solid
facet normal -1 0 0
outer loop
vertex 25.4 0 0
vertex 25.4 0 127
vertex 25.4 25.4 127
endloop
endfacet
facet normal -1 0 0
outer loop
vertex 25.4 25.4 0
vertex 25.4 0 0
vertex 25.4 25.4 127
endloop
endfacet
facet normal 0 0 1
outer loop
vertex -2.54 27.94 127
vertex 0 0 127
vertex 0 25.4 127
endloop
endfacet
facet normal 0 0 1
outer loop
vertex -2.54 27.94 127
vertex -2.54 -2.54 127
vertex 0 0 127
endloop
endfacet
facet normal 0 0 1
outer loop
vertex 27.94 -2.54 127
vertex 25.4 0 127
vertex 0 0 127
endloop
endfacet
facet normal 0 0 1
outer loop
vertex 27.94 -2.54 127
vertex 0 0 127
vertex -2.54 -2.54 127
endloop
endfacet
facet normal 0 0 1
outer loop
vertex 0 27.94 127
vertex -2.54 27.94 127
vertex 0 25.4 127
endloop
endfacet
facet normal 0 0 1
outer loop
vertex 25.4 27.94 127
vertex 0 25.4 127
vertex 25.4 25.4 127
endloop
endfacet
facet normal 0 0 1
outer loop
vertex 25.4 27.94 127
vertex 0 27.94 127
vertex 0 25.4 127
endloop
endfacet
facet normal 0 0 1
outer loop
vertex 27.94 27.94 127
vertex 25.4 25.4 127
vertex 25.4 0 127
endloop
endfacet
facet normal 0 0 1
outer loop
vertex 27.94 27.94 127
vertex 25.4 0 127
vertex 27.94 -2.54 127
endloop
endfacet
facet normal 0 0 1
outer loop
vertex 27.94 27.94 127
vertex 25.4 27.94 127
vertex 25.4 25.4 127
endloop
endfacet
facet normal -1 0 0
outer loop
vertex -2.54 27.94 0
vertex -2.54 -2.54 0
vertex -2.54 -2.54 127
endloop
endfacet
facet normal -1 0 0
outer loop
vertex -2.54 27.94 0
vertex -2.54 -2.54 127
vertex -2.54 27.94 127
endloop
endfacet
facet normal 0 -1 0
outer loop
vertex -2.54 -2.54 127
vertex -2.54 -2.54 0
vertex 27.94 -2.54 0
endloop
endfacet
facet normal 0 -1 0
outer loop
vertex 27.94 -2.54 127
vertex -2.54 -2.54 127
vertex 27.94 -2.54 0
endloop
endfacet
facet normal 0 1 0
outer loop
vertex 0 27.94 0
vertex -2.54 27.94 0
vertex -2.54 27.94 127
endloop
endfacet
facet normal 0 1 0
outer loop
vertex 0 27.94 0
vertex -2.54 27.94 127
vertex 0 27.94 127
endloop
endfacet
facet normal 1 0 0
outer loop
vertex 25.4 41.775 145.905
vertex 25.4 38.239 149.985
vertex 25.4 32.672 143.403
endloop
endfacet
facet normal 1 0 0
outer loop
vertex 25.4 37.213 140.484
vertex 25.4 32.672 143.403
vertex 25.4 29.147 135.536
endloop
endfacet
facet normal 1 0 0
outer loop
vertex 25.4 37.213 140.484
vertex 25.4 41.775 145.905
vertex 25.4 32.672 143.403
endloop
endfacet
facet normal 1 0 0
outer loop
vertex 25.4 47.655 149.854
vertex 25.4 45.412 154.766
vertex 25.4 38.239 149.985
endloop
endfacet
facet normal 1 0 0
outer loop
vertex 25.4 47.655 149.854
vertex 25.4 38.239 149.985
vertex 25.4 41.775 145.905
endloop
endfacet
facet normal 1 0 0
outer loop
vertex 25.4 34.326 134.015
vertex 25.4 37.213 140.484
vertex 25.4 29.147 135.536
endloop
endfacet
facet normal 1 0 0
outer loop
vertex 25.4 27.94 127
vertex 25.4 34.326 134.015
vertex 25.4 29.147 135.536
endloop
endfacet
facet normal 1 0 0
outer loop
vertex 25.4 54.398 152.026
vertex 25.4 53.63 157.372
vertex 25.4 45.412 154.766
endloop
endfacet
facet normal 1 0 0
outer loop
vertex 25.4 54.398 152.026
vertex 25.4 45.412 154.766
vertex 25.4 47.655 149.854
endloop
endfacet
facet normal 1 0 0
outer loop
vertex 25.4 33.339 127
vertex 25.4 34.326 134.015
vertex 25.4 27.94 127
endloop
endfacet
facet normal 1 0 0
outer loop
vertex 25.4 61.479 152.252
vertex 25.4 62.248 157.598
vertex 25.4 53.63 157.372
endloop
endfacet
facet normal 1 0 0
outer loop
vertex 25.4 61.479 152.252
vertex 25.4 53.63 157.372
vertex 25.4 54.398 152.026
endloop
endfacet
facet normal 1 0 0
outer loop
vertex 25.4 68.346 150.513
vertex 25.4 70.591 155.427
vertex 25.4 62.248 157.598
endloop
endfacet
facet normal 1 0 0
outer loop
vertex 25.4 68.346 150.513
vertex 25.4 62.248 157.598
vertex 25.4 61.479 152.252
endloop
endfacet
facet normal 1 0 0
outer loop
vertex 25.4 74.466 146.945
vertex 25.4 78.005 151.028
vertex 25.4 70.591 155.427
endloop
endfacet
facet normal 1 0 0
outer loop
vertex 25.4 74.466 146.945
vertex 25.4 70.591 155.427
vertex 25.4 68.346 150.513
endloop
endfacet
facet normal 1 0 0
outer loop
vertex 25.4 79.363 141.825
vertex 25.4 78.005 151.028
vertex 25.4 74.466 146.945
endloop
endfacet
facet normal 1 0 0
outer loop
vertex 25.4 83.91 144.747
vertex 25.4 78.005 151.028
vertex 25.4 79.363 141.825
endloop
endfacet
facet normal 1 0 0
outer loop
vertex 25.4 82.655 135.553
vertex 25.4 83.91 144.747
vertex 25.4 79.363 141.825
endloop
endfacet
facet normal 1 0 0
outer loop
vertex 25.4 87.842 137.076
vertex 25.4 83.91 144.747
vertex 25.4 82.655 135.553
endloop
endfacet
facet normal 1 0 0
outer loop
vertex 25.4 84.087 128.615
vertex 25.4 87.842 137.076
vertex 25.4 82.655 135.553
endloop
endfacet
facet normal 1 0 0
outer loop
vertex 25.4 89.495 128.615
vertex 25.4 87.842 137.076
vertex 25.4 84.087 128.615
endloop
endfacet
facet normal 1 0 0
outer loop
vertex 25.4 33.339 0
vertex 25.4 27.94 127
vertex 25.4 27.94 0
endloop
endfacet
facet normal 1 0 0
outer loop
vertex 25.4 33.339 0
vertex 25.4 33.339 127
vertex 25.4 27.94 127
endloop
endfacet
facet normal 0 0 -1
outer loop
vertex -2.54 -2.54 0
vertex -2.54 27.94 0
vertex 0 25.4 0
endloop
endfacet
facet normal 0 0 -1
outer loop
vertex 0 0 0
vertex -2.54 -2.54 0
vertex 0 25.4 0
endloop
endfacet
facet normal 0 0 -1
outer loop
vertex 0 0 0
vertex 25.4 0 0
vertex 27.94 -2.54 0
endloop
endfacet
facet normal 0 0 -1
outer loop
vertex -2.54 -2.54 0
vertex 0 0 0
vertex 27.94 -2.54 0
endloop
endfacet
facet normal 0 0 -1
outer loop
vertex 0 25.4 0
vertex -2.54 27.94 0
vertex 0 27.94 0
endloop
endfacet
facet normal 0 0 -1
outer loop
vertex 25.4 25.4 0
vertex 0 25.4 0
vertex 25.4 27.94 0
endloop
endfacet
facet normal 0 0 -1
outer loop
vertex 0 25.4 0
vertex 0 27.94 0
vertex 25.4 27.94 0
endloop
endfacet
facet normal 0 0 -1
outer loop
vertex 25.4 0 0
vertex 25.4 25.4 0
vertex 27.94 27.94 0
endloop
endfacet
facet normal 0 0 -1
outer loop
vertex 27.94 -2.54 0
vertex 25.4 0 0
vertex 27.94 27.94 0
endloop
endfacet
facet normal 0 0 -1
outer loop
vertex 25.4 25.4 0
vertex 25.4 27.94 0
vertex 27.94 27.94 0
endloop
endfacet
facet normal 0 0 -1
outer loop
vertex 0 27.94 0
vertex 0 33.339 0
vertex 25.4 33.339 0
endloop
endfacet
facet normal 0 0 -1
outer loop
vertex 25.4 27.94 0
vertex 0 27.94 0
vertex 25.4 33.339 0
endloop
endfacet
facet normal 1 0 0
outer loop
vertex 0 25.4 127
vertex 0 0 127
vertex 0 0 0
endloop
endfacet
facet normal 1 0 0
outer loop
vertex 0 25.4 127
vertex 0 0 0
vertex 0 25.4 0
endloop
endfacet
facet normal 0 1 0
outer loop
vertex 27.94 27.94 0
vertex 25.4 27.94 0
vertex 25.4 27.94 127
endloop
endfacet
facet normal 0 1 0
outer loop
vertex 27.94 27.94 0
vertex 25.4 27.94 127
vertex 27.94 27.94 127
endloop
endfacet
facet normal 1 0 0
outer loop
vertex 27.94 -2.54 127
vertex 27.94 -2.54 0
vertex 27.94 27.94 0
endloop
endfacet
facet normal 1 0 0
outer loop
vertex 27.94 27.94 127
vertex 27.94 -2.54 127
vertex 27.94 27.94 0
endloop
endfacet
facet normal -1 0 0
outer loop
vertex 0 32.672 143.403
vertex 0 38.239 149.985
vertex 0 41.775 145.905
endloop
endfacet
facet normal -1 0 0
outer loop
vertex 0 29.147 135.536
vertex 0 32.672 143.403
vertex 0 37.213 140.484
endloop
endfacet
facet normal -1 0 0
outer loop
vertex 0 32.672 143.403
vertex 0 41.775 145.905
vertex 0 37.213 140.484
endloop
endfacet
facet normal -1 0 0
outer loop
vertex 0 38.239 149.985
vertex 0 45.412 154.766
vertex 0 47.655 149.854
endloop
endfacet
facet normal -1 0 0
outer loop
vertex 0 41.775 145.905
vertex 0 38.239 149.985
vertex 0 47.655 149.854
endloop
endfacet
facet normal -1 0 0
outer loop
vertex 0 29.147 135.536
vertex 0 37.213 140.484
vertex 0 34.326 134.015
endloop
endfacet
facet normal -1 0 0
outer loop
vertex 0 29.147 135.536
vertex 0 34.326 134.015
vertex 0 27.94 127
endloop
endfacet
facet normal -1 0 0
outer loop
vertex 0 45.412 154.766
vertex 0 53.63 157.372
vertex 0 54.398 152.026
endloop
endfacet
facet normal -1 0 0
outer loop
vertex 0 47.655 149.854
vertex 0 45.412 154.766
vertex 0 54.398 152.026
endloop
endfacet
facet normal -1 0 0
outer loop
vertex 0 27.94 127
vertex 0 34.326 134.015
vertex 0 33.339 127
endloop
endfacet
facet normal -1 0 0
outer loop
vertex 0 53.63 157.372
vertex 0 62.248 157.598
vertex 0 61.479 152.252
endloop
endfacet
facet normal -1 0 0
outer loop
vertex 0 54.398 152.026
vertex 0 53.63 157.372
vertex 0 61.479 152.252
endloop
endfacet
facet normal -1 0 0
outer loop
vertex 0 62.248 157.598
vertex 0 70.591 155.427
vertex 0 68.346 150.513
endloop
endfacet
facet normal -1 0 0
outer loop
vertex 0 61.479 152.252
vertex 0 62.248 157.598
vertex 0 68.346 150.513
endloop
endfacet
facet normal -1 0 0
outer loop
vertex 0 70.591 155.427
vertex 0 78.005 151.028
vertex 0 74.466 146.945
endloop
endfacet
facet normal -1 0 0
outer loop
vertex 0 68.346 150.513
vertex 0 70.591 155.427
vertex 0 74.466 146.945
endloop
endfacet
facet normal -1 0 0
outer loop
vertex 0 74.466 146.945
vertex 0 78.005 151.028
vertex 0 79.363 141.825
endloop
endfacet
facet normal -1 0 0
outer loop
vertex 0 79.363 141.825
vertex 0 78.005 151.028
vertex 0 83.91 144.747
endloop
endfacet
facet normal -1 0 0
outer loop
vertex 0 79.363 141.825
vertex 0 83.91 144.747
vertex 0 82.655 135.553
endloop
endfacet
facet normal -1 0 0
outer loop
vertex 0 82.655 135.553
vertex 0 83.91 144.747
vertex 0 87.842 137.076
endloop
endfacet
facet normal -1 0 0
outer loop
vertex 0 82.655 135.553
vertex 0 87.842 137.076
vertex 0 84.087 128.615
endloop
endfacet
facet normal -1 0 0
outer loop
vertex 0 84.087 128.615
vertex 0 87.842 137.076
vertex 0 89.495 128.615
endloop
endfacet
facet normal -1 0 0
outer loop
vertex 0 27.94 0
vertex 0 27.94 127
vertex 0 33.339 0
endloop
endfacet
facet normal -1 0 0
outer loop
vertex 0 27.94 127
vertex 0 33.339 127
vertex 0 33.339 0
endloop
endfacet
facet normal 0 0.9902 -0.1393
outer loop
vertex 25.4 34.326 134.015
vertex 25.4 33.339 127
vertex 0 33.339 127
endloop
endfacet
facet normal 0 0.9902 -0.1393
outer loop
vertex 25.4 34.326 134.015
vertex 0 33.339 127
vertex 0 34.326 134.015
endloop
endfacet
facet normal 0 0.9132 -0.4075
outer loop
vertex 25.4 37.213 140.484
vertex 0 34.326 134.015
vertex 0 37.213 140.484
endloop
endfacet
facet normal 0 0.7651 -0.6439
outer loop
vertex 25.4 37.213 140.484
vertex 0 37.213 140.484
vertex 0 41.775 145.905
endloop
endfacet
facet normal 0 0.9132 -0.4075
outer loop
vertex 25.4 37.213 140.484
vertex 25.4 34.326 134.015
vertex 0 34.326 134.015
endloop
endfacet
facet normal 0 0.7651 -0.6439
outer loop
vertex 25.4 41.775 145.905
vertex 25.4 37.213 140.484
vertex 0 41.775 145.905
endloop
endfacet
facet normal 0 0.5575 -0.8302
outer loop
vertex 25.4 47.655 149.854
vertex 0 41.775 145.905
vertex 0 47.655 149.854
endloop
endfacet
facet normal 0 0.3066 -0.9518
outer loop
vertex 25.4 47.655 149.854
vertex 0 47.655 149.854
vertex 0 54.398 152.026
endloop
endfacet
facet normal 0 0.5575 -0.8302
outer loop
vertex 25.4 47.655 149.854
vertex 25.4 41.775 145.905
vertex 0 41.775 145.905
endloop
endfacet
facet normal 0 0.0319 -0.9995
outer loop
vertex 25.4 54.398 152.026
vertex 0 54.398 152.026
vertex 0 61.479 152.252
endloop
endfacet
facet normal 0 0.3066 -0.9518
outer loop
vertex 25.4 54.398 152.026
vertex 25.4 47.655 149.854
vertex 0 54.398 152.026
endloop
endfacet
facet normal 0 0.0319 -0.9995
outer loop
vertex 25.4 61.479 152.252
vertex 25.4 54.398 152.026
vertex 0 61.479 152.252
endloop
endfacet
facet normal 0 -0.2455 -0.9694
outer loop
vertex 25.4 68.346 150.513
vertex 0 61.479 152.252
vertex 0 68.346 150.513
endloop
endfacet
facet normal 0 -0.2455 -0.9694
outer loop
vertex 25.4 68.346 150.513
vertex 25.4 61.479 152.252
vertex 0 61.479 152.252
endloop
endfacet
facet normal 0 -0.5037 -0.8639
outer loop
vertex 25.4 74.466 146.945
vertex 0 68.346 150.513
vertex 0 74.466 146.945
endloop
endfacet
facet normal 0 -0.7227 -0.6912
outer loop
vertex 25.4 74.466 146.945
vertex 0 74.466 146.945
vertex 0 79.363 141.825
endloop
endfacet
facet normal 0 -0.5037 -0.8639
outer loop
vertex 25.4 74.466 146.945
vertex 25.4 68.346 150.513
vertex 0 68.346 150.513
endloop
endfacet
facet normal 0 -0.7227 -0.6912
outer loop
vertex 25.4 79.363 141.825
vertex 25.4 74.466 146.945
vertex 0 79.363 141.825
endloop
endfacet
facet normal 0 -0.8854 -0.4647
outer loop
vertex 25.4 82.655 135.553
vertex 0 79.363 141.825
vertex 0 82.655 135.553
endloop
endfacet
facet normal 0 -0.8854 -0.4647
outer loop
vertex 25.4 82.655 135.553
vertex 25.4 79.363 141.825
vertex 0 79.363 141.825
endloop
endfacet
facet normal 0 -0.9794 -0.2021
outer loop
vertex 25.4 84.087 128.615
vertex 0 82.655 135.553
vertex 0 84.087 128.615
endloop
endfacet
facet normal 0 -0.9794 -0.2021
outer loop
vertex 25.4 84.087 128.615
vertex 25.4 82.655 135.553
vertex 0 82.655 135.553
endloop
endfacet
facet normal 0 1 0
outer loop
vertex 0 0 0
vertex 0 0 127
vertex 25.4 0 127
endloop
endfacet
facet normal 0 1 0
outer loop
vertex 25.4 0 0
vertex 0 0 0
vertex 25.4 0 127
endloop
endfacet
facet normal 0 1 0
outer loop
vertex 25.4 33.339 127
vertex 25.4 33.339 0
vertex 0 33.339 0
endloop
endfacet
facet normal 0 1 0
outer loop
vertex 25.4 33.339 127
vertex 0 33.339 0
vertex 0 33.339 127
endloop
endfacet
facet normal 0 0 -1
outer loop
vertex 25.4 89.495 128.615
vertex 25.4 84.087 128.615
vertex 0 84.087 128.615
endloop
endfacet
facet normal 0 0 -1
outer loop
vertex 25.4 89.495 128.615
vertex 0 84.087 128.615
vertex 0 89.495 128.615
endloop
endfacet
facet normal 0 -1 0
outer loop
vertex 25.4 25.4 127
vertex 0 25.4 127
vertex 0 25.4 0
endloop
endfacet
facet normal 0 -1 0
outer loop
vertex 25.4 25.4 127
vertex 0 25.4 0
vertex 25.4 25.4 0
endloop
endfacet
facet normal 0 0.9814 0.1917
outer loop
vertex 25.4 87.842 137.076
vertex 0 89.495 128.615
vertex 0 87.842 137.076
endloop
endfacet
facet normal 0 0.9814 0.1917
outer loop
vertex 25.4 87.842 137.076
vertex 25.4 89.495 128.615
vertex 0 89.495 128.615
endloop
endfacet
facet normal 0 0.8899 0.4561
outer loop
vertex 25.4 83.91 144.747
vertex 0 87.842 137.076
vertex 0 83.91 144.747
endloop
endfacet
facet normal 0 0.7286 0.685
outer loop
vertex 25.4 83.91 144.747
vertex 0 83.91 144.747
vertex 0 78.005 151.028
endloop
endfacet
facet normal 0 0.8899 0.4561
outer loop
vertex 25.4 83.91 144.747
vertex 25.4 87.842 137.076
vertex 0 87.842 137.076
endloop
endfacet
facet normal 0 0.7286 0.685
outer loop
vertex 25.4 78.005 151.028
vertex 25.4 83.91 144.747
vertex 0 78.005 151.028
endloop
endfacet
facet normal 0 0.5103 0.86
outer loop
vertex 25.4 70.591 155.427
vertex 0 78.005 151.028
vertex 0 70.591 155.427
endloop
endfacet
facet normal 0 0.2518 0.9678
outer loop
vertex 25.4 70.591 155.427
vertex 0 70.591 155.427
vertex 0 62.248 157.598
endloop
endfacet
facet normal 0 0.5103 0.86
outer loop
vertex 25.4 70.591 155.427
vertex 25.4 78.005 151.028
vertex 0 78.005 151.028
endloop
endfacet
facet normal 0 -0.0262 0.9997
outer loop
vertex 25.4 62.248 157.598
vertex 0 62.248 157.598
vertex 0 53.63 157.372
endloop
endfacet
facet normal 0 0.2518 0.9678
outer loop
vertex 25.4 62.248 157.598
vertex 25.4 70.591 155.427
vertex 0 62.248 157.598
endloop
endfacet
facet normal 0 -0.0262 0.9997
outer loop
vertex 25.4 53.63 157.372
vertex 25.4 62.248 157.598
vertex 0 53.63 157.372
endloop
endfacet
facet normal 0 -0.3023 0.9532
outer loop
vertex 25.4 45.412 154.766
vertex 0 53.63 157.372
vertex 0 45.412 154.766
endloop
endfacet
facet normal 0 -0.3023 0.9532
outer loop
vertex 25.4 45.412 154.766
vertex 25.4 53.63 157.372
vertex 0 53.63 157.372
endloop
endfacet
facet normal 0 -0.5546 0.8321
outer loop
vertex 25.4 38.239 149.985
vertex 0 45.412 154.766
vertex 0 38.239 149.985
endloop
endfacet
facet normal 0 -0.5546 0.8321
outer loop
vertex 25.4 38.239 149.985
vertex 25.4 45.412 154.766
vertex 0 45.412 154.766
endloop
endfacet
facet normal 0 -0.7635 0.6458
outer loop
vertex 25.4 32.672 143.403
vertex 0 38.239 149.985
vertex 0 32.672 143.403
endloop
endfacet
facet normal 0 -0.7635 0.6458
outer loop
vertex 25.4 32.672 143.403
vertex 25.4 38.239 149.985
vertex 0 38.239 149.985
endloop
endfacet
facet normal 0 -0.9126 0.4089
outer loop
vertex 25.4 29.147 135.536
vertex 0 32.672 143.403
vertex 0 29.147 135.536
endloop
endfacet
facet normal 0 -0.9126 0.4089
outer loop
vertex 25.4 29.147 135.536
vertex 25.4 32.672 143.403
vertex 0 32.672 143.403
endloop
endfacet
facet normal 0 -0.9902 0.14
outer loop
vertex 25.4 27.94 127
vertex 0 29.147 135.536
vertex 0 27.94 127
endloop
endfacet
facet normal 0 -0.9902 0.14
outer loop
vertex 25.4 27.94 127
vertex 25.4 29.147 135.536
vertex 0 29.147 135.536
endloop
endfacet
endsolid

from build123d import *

# Parameters (mm, degrees)
SKETCH1_W           = 30.48
SKETCH1_H           = 30.48
SKETCH1_W_2         = 25.4
SKETCH1_H_2         = 25.4
BOSS_EXTRUDE1_DEPTH = 127
BOSS_EXTRUDE2_DEPTH = 12.7


with BuildPart() as part:
    # Sketch1 → Boss-Extrude1 (new body)
    with BuildSketch(Plane.XY):
        with Locations((12.7, 12.7)):
            Rectangle(SKETCH1_W, SKETCH1_H)
        with Locations((12.7, 12.7)):
            Rectangle(SKETCH1_W_2, SKETCH1_H_2, mode=Mode.SUBTRACT)
    extrude(amount=BOSS_EXTRUDE1_DEPTH)

    # Sketch2 → Boss-Extrude2 (add, symmetric)
    with BuildSketch(Plane(origin=(12.7, 0, 0), x_dir=(0, 0, -1), z_dir=(1, 0, 0))):
        with BuildLine():
            Line((0, 27.94), (0, 33.338518846))
            Line((0, 33.338518846), (-127, 33.338518846))
            ThreePointArc((-127, 33.338518846), (-152.387152316, 57.930745818), (-128.61472889, 84.087141109))
            Line((-128.61472889, 84.087141109), (-128.61472889, 89.494679428))
            ThreePointArc((-128.61472889, 89.494679428), (-157.787927459, 57.930876659), (-127, 27.94))
            Line((-127, 27.94), (0, 27.94))
        make_face()
    extrude(amount=BOSS_EXTRUDE2_DEPTH, both=True)


solid = part.part
